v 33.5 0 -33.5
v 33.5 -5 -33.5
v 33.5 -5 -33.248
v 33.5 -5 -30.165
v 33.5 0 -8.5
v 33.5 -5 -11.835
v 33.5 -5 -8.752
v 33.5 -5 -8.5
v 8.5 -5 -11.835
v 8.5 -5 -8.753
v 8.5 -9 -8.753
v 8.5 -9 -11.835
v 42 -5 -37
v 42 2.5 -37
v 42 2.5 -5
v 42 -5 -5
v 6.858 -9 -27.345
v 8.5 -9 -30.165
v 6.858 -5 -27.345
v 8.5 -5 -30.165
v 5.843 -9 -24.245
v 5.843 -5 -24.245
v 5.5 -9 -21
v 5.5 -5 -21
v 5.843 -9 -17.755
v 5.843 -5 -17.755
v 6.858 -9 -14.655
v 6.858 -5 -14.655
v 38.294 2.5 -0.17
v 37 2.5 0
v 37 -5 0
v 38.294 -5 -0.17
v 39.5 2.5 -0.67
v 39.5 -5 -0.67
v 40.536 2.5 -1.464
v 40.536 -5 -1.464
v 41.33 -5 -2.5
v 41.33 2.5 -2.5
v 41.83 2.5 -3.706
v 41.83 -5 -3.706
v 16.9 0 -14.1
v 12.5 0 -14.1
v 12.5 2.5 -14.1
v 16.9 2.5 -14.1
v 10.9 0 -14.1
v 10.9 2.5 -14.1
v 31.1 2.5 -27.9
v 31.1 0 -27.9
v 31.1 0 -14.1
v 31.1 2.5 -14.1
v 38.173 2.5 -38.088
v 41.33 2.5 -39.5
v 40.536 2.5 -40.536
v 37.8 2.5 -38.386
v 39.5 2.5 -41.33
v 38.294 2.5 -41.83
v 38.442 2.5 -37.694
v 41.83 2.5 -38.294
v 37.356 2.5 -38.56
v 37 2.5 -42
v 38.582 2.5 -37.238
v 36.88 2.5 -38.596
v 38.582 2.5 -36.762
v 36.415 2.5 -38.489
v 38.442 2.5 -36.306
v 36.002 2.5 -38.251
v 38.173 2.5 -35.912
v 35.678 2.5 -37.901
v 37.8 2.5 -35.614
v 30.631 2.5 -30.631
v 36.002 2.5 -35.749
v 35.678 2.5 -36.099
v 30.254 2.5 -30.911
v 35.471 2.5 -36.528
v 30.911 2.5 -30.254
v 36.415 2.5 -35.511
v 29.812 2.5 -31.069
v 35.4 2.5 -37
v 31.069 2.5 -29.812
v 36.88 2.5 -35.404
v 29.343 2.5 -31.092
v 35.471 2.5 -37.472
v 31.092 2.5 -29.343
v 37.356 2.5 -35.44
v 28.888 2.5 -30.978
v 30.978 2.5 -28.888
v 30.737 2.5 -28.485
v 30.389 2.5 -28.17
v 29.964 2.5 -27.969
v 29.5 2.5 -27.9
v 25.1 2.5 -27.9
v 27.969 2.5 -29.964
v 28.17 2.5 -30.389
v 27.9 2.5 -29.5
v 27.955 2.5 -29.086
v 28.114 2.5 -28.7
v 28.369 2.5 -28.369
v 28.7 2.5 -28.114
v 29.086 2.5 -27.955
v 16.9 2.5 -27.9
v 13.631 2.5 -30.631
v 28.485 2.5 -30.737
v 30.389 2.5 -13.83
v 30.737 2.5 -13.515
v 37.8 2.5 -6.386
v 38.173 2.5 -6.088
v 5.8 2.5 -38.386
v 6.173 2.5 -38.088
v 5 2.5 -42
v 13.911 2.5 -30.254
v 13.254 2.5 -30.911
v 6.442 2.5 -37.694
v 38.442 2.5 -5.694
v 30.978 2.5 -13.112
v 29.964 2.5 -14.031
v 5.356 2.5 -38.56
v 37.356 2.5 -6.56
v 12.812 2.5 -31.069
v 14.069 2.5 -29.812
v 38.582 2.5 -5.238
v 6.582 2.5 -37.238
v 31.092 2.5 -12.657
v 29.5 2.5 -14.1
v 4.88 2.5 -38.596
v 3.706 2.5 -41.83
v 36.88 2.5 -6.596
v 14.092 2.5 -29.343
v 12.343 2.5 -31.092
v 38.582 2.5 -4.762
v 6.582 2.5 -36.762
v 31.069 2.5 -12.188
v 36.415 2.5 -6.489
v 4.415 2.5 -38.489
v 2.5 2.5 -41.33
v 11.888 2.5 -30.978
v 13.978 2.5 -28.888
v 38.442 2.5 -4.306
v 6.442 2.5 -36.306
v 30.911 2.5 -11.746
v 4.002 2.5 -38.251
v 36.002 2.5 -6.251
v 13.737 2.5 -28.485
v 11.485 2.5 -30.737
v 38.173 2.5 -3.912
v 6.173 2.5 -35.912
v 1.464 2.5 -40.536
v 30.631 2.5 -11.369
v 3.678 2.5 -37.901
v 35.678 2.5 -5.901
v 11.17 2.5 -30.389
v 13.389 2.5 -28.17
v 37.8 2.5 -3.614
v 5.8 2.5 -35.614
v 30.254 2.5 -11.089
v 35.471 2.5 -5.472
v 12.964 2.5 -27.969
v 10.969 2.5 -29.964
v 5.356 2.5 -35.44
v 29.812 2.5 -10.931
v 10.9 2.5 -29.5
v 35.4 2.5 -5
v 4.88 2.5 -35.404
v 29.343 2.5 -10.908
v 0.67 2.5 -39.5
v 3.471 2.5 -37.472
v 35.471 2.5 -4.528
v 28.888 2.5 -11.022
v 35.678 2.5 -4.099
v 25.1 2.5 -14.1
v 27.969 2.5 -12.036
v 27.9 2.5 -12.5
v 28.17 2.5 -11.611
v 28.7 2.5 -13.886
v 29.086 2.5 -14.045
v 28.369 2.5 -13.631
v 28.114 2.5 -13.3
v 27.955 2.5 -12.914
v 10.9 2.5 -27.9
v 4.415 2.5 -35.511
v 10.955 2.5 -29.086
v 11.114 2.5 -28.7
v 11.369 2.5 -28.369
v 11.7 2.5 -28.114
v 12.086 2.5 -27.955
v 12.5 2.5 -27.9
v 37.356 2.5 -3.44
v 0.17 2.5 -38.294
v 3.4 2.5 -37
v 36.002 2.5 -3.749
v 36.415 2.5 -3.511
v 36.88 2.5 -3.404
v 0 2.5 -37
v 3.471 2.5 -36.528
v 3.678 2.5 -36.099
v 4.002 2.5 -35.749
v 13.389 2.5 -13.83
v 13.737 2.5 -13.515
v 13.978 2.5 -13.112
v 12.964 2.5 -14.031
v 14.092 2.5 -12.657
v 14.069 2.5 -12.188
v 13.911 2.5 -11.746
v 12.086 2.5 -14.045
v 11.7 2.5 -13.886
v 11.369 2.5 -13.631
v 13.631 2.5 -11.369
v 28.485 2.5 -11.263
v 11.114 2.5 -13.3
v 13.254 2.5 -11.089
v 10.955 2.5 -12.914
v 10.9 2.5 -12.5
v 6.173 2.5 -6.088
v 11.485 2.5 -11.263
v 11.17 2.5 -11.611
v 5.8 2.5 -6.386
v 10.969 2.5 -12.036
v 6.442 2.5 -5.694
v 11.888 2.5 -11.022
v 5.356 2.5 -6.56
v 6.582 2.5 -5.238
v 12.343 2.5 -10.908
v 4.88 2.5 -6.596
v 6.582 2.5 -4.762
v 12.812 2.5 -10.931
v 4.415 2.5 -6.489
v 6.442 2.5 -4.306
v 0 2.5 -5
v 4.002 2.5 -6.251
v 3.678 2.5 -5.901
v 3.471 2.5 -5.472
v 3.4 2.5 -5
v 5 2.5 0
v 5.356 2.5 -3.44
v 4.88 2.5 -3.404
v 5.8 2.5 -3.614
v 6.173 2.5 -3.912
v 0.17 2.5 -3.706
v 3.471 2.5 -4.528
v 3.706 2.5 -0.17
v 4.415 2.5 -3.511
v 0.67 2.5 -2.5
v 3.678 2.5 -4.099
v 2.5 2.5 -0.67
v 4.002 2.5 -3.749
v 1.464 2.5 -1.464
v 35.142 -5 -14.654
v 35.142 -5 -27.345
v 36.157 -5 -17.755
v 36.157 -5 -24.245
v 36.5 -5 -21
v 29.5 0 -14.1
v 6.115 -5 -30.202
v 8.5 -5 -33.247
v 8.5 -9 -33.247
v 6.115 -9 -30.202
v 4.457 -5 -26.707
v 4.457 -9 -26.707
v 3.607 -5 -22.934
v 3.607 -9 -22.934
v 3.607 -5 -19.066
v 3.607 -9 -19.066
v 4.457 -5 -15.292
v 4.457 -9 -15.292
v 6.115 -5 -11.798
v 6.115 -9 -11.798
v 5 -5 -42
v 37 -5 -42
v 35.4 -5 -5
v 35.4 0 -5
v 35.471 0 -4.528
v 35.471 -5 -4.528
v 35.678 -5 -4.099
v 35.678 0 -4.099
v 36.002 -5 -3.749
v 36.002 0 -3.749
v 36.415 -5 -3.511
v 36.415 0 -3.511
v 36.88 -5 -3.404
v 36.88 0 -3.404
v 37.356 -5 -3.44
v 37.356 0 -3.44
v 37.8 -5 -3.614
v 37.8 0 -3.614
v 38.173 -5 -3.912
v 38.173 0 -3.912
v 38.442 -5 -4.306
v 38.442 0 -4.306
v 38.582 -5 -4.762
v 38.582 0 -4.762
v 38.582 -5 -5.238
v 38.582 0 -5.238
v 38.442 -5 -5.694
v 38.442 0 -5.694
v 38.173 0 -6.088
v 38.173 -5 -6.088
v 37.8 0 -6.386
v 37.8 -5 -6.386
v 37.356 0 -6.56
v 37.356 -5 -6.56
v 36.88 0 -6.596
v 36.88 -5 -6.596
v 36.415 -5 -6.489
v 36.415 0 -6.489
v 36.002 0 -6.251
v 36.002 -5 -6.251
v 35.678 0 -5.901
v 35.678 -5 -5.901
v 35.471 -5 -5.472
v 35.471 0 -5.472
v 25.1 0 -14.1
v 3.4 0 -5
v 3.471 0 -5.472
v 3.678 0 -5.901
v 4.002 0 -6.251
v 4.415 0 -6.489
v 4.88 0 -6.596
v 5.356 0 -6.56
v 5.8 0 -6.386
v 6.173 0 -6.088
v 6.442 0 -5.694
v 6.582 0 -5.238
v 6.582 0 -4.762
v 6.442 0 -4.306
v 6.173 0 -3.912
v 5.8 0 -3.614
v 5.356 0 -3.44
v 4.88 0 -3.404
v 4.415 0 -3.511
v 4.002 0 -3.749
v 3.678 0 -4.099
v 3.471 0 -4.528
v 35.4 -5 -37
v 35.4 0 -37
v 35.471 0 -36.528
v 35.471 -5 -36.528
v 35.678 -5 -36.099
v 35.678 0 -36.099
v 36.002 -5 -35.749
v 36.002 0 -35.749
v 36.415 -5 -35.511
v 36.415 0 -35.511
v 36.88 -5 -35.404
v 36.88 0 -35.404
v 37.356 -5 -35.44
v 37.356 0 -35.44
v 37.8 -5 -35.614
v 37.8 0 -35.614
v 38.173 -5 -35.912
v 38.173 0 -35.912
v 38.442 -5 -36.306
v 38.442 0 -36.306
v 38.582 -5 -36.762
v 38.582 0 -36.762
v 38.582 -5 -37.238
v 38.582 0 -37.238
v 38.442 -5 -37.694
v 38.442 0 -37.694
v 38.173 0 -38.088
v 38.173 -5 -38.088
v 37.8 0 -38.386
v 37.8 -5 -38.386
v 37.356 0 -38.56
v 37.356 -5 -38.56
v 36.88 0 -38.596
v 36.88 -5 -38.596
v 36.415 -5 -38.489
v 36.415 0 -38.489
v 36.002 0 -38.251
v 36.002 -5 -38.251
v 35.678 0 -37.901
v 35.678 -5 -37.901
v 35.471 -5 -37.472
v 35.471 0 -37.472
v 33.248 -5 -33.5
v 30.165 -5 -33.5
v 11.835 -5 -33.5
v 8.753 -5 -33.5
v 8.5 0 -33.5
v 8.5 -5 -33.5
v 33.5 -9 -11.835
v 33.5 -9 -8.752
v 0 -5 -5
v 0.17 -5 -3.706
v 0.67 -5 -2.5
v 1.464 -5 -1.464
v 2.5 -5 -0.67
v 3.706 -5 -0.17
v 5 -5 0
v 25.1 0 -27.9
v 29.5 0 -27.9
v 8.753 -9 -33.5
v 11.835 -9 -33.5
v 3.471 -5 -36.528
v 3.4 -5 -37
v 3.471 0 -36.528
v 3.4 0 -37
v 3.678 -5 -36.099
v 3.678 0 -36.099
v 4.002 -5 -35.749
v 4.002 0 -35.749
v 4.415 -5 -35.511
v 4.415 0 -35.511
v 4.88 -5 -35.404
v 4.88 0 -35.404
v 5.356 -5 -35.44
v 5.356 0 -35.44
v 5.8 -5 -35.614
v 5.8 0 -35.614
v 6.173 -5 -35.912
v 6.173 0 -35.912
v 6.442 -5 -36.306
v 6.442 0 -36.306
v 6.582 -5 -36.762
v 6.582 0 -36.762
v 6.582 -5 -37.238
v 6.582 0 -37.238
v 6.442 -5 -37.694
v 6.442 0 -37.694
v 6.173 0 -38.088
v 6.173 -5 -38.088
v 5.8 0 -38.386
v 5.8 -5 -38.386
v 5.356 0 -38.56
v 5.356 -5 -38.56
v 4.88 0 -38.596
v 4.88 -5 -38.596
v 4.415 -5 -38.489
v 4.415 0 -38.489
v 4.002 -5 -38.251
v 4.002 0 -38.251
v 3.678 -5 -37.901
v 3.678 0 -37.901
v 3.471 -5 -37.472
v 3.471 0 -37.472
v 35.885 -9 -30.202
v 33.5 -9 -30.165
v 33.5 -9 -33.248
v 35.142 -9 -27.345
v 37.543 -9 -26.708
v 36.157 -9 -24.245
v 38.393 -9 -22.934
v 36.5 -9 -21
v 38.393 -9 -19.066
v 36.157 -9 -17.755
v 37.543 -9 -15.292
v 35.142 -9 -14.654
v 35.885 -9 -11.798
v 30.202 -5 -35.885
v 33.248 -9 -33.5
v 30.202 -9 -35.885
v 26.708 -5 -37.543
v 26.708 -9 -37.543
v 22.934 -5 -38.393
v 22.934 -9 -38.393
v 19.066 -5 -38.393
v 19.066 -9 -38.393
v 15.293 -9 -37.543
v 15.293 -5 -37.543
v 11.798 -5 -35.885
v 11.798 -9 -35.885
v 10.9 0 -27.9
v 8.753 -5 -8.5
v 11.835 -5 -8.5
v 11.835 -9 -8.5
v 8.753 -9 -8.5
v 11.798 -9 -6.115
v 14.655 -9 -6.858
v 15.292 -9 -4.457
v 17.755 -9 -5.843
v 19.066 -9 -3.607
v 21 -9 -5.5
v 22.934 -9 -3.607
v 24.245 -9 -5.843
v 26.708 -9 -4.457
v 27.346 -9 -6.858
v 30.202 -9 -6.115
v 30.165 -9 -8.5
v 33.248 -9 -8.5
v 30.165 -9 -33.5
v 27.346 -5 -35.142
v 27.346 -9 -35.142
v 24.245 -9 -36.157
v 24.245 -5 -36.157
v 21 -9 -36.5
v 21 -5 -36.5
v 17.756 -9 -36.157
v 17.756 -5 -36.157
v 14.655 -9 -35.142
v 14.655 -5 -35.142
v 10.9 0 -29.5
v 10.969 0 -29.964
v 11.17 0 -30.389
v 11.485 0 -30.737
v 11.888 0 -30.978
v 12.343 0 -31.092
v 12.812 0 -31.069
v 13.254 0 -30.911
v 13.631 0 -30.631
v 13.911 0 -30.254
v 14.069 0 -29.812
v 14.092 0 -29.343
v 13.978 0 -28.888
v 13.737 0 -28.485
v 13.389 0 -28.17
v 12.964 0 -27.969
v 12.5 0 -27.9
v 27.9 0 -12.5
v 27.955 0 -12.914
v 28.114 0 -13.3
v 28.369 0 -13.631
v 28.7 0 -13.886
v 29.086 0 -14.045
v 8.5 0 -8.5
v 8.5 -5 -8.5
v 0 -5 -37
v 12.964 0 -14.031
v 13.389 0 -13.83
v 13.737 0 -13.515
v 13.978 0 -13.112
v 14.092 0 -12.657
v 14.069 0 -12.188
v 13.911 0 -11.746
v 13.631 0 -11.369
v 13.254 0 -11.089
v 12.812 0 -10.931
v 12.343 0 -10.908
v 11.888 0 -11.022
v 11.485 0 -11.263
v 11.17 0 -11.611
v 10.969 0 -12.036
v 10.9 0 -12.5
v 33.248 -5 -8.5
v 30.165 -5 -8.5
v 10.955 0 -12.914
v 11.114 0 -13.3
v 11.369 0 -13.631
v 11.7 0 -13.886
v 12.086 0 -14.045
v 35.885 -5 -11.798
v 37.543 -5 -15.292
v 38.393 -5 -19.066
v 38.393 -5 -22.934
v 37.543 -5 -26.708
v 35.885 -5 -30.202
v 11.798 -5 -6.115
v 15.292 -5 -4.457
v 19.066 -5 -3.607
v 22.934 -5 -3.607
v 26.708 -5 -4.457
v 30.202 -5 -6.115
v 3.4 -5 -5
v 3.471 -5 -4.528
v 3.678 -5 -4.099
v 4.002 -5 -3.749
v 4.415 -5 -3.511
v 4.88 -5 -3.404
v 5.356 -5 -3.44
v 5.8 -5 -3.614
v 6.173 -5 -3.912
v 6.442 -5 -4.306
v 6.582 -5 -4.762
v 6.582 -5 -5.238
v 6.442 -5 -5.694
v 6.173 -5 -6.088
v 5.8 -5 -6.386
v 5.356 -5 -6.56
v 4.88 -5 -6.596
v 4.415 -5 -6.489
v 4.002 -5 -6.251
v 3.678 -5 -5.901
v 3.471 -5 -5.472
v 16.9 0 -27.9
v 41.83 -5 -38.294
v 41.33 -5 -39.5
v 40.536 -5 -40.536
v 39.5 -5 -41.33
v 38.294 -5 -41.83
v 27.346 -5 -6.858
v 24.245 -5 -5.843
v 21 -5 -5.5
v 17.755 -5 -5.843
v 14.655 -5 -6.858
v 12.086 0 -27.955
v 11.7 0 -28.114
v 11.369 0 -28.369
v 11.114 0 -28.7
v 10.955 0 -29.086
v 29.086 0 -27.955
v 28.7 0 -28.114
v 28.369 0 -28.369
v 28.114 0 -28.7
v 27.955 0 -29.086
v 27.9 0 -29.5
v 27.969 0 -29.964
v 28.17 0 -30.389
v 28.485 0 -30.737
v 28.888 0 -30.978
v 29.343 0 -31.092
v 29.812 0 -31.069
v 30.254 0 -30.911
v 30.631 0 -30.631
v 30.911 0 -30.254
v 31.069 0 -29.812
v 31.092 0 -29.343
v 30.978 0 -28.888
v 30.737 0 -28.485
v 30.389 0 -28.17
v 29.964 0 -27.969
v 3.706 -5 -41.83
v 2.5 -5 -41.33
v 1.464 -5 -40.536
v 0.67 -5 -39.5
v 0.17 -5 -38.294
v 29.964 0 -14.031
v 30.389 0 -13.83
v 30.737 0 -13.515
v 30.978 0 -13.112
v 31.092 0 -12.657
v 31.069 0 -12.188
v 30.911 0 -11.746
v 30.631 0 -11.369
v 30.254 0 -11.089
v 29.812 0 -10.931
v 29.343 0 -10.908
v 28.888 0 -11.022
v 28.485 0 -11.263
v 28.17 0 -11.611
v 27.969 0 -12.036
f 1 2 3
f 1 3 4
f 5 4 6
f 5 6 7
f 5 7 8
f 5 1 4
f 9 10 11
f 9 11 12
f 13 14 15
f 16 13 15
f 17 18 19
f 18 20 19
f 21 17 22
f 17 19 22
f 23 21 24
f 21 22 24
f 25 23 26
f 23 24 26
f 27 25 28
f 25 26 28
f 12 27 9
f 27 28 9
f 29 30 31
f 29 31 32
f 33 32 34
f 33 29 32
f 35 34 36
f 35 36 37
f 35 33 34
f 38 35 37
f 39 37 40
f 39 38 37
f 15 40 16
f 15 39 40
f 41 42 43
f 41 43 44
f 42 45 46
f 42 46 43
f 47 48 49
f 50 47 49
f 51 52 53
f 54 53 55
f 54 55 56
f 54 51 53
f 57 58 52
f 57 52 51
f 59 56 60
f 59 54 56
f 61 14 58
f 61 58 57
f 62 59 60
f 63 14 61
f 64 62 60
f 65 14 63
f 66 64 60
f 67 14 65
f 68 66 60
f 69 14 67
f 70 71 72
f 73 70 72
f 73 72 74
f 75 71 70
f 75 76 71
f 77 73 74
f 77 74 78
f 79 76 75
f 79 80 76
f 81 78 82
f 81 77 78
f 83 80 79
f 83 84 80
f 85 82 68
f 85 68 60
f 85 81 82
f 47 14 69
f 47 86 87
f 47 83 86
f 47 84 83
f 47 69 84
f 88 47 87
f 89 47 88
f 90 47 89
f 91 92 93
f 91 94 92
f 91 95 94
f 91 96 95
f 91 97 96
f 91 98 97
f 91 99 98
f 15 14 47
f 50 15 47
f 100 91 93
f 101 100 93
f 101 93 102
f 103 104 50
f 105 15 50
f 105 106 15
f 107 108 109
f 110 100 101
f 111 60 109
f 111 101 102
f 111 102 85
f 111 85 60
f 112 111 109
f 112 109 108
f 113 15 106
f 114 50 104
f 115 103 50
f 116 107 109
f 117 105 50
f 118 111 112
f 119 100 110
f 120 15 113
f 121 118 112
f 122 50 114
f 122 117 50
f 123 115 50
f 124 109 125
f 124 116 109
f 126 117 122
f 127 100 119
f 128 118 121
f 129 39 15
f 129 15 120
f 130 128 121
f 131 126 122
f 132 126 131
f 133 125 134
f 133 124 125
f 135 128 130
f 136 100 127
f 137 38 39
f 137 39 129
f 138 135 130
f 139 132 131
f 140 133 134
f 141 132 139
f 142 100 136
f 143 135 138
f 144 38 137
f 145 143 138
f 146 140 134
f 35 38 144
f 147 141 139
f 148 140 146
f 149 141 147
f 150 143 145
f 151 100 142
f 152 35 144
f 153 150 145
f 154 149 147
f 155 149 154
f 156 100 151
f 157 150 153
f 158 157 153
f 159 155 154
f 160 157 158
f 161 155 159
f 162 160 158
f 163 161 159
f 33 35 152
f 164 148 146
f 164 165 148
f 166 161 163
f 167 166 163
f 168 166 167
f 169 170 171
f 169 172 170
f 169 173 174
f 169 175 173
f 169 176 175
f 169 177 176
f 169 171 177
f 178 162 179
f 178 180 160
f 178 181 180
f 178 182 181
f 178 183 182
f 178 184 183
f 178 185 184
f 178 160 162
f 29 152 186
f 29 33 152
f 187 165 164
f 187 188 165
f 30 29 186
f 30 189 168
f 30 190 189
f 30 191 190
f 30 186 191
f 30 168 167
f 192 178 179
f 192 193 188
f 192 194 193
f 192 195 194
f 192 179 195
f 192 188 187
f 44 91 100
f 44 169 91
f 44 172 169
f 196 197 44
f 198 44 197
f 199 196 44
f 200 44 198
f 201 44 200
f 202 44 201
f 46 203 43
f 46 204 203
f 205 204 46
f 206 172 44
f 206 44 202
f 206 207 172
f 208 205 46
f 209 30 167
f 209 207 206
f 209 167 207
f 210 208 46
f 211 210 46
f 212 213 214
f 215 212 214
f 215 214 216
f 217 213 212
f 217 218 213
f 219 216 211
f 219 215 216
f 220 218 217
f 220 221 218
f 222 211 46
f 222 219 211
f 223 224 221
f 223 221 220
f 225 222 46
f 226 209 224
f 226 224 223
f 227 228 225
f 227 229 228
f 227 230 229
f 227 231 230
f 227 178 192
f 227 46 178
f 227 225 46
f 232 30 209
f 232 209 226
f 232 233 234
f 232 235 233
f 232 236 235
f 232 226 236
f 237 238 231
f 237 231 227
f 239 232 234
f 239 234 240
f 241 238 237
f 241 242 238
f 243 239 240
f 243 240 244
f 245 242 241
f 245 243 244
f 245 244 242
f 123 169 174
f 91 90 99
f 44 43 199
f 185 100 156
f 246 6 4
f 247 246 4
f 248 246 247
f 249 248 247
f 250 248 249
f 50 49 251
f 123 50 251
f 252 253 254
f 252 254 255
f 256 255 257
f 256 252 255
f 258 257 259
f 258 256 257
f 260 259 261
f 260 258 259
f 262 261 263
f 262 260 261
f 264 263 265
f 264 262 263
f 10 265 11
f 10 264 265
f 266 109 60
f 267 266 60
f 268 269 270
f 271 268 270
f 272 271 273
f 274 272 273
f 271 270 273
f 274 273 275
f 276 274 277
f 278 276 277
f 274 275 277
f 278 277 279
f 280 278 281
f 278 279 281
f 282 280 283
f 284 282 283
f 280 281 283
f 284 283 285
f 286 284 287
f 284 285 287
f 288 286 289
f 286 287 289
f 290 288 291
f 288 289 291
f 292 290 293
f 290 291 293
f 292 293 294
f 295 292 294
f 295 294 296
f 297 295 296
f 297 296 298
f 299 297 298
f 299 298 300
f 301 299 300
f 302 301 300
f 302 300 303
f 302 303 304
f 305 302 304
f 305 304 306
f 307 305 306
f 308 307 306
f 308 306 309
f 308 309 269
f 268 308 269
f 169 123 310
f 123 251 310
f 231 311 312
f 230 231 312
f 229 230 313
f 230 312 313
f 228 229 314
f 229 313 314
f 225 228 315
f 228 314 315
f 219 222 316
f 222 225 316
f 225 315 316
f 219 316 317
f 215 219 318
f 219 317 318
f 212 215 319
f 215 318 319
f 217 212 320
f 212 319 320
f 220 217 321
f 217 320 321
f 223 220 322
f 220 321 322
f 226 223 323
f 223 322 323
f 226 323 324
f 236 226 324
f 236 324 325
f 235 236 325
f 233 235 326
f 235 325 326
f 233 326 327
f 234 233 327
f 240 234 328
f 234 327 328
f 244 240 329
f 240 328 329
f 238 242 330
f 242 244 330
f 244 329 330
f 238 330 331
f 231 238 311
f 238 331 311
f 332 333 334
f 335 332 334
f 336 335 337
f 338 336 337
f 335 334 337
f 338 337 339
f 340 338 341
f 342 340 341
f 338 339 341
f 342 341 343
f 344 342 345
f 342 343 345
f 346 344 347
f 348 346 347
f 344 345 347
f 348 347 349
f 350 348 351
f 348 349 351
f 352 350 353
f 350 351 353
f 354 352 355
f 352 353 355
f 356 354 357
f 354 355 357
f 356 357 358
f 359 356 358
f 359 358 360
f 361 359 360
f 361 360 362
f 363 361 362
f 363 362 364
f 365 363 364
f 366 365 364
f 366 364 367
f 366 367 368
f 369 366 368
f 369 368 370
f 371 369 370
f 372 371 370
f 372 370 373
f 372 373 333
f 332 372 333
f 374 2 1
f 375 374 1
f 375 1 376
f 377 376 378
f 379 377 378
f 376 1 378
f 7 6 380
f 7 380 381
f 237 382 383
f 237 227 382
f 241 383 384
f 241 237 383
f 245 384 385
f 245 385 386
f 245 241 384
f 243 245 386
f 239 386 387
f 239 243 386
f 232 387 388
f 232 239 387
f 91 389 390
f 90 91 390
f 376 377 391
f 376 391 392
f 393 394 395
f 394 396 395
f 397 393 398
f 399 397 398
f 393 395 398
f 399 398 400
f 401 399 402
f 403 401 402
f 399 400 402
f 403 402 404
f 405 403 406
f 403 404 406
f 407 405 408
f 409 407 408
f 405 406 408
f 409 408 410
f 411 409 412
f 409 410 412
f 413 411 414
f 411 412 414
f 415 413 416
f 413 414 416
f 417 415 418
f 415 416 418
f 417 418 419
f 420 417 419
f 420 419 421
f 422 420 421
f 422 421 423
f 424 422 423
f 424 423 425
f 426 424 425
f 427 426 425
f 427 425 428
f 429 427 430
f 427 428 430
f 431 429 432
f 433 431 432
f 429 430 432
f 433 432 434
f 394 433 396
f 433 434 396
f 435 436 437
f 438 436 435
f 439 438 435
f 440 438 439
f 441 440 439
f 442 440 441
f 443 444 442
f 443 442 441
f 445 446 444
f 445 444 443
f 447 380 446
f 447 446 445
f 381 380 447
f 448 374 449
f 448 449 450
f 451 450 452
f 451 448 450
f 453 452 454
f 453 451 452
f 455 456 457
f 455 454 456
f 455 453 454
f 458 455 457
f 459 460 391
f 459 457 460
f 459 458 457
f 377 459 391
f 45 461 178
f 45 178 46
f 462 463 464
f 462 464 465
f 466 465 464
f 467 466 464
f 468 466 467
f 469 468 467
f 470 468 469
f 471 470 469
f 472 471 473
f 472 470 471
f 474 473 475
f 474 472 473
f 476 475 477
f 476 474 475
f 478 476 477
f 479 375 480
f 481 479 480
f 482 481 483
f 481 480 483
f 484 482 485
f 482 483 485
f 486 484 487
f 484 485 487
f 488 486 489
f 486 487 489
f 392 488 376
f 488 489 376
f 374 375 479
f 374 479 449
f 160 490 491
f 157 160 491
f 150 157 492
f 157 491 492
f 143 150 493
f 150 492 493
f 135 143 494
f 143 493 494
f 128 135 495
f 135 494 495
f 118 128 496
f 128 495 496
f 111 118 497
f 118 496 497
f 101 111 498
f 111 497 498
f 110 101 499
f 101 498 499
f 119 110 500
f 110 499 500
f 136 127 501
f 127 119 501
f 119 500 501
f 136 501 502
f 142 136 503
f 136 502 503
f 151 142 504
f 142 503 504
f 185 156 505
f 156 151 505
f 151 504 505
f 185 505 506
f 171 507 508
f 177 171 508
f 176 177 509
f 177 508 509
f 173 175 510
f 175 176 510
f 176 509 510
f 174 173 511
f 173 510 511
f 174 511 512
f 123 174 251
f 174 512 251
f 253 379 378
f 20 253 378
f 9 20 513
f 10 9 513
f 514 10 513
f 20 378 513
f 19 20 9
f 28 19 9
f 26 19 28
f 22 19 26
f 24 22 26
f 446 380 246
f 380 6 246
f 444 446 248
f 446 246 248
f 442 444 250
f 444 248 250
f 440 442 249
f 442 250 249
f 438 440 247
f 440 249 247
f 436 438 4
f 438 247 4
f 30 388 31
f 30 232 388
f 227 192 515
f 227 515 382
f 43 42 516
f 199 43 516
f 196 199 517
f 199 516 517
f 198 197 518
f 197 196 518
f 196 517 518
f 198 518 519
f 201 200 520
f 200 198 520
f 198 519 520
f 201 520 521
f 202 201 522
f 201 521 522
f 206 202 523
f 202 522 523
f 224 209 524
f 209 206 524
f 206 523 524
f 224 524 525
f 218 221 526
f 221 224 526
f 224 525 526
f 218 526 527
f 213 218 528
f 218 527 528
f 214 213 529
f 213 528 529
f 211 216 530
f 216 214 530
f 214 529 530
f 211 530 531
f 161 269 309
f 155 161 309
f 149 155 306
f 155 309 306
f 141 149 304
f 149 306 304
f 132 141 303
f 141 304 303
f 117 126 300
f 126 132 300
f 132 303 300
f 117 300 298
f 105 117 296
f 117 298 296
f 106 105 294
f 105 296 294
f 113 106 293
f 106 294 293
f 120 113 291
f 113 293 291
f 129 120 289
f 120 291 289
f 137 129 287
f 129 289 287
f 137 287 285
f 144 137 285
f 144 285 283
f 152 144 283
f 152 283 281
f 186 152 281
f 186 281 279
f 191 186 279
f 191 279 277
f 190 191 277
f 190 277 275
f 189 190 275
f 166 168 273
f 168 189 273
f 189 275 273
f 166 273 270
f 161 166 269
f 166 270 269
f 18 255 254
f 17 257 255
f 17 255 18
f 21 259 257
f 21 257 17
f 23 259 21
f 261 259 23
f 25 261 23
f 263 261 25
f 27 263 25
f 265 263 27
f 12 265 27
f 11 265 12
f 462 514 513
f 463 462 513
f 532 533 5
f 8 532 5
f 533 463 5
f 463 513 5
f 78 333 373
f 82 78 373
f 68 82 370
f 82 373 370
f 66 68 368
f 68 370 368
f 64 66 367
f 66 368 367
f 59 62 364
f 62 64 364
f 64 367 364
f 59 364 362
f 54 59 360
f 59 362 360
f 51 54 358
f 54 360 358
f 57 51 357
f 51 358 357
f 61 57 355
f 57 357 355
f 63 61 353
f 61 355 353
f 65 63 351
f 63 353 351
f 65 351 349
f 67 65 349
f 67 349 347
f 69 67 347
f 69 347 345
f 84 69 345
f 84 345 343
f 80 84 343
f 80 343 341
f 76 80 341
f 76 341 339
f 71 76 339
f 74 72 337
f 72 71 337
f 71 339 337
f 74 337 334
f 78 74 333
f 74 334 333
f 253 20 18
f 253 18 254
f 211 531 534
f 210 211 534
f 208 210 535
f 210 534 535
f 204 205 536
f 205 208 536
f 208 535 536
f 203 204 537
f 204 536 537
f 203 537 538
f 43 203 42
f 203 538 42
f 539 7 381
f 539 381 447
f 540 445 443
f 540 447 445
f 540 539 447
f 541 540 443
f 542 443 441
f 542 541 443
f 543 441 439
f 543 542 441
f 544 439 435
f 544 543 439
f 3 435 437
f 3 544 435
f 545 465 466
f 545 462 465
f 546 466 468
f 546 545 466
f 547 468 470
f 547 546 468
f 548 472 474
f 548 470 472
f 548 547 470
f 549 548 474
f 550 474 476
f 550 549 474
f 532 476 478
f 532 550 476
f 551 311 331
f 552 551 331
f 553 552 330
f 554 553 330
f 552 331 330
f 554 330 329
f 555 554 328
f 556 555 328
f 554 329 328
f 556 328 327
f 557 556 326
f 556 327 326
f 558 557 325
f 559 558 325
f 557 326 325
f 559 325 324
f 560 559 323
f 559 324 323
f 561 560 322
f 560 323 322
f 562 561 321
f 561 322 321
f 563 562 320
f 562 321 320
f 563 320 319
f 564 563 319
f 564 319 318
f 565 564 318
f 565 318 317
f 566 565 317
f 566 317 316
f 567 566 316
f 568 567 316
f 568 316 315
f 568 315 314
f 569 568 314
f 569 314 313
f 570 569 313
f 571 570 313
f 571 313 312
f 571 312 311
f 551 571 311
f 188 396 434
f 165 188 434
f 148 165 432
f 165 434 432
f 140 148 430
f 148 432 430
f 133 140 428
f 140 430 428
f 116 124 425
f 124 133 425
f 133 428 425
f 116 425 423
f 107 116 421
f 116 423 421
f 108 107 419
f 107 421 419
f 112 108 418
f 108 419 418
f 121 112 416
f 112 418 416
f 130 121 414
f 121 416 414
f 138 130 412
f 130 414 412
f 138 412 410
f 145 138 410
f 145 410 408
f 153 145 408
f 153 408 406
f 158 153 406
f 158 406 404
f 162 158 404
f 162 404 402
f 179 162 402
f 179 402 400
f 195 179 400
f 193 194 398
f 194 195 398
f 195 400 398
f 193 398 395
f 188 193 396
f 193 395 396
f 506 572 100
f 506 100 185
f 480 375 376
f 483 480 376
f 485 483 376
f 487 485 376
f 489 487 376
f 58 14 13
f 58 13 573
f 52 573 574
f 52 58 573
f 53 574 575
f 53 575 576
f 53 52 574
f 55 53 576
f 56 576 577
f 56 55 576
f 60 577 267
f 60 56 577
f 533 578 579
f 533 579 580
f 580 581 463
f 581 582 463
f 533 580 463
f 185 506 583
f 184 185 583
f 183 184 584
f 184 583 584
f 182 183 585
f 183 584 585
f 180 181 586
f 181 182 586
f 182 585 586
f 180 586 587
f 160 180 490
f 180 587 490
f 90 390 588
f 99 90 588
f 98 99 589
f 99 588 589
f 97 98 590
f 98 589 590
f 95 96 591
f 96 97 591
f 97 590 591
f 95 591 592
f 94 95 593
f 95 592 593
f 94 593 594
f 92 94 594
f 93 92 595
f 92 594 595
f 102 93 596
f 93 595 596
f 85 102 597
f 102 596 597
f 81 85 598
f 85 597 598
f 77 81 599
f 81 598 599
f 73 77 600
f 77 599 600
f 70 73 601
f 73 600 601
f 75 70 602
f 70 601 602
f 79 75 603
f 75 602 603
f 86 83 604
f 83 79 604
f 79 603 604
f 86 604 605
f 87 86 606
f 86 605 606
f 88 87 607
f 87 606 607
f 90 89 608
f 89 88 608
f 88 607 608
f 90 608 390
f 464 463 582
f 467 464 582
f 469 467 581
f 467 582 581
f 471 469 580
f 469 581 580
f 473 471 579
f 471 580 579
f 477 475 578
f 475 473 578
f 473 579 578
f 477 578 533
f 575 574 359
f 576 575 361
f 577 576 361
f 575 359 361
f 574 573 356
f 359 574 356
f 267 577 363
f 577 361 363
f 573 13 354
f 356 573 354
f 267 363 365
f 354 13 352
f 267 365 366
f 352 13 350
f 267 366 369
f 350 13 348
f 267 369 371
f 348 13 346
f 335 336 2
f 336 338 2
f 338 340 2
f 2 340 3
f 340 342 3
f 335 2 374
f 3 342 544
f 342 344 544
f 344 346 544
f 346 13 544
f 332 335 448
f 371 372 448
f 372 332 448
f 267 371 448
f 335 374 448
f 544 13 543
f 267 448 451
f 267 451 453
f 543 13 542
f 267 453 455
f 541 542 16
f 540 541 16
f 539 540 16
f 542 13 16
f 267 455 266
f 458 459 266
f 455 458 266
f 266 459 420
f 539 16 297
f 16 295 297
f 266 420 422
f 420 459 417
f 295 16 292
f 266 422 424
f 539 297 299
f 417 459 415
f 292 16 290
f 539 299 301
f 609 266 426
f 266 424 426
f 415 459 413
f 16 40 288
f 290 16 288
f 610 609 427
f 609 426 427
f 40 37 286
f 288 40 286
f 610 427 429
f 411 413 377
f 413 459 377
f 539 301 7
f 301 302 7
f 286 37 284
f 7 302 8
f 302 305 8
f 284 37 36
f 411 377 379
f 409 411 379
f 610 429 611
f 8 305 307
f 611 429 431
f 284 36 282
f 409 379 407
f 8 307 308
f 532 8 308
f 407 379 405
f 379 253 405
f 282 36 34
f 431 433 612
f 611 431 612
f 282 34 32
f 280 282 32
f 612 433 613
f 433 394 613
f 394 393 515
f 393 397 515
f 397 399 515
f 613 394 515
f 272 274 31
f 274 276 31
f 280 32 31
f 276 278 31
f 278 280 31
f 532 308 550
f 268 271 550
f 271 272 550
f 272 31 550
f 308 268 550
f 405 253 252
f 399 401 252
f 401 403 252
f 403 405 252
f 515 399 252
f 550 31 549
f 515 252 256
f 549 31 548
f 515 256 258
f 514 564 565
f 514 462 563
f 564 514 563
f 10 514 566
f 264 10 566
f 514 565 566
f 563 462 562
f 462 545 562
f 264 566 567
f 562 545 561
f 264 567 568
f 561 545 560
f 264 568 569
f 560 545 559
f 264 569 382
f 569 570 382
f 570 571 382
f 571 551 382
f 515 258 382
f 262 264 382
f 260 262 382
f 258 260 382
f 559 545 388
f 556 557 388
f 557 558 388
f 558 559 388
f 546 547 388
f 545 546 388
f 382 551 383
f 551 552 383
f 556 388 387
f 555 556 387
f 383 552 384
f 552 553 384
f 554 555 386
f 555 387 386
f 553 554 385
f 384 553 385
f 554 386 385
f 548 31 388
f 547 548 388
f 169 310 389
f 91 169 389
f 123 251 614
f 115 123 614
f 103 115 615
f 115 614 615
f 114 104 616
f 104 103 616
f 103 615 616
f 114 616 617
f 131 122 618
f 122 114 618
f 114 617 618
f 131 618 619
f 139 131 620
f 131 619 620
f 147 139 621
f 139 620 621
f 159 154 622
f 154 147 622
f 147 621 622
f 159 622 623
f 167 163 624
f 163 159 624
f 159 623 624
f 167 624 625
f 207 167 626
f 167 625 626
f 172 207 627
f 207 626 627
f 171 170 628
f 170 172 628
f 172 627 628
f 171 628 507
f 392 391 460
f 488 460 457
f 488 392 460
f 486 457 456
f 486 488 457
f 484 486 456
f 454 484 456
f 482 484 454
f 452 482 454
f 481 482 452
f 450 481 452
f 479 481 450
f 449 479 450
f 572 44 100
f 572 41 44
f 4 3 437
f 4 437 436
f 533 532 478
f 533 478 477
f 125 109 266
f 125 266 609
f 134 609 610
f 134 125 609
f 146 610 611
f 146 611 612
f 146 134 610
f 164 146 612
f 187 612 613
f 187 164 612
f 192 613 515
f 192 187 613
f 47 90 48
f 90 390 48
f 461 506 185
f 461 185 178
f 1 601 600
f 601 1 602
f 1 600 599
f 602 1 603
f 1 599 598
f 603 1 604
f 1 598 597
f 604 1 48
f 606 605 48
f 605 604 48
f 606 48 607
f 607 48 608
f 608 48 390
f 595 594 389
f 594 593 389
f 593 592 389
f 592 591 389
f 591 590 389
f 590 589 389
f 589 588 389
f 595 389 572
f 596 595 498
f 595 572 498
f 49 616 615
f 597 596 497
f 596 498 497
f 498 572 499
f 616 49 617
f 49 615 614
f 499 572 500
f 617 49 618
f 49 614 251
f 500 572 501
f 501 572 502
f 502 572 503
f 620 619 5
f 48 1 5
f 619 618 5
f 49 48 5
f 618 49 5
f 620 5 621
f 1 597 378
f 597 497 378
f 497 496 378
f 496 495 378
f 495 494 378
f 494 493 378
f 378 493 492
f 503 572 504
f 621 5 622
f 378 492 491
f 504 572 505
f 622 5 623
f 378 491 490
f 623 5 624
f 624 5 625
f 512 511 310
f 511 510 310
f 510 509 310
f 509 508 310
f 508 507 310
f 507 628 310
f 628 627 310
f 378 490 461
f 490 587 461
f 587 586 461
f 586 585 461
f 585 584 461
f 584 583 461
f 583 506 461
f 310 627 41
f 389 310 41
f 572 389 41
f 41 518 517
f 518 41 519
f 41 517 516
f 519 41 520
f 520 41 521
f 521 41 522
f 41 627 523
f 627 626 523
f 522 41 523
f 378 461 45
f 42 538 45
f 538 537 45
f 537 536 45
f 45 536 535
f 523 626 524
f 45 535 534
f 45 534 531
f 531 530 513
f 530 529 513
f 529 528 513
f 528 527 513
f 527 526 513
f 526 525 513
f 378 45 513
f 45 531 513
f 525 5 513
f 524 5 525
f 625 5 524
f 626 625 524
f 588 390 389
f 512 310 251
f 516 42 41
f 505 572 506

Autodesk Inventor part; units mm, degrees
ref_plane "YZ Plane" through (0, 0, 0) normal (1, 0, 0) x (0, 1, 0)
ref_plane "XZ Plane" through (0, 0, 0) normal (0, 1, 0) x (-1, 0, 0)
ref_plane "XY Plane" through (0, 0, 0) normal (0, 0, 1) x (1, 0, 0)
sketch "スケッチ1" plane through (0, 0, 0) normal (0, 1, 0) x (-1, 0, 0)
  line L0 (-5, 0) -> (-21, 0)
  line L1 (-21, -21) -> (0, -21)
  line L2 (0, -21) -> (0, -5)
  arc A0 (0, -5) -> (-5, 0) centre (-5, -5) ccw
  line L3 (0, -5) -> (0, -8)
  circle A1 centre (-5, -5) radius 1.6
  line L4 (-21, -21) -> (-8.5, -21)
  line L5 (-8.5, -21) -> (-8.5, -8.5)
  line L6 (-8.5, -8.5) -> (-21, -8.5)
  line L7 (-8.5, -8.5) -> (-8.5, -11.5)
  circle A2 centre (-12.5, -12.5) radius 1.6
  line L8 (-5, -42) -> (-21, -42)
  line L9 (0, -21) -> (0, -37)
  arc A3 (-5, -42) -> (0, -37) centre (-5, -37) ccw
  line L10 (0, -37) -> (0, -34)
  circle A4 centre (-5, -37) radius 1.6
  line L11 (-8.5, -21) -> (-8.5, -33.5)
  line L12 (-8.5, -33.5) -> (-21, -33.5)
  line L13 (-8.5, -33.5) -> (-8.5, -30.5)
  circle A5 centre (-12.5, -29.5) radius 1.6
  line L14 (-37, 0) -> (-21, 0)
  line L15 (-21, -21) -> (-42, -21)
  line L16 (-42, -21) -> (-42, -5)
  arc A6 (-37, 0) -> (-42, -5) centre (-37, -5) ccw
  line L17 (-42, -5) -> (-42, -8)
  circle A7 centre (-37, -5) radius 1.6
  line L18 (-21, -21) -> (-33.5, -21)
  line L19 (-33.5, -21) -> (-33.5, -8.5)
  line L20 (-33.5, -8.5) -> (-21, -8.5)
  line L21 (-33.5, -8.5) -> (-33.5, -11.5)
  circle A8 centre (-29.5, -12.5) radius 1.6
  circle A9 centre (-37, -37) radius 1.6
  line L22 (-42, -37) -> (-42, -34)
  line L23 (-33.5, -33.5) -> (-33.5, -30.5)
  circle A10 centre (-29.5, -29.5) radius 1.6
  line L24 (-37, -42) -> (-21, -42)
  line L25 (-42, -21) -> (-42, -37)
  line L26 (-33.5, -33.5) -> (-21, -33.5)
  line L27 (-33.5, -21) -> (-33.5, -33.5)
  arc A11 (-42, -37) -> (-37, -42) centre (-37, -37) ccw
  line L28 (-10.9, -14.1) -> (-16.9, -14.1)
  line L29 (-16.9, -14.1) -> (-16.9, -27.9)
  line L30 (-16.9, -27.9) -> (-10.9, -27.9)
  line L31 (-10.9, -27.9) -> (-10.9, -14.1)
  line L32 (-31.1, -14.1) -> (-25.1, -14.1)
  line L33 (-25.1, -14.1) -> (-25.1, -27.9)
  line L34 (-25.1, -27.9) -> (-31.1, -27.9)
  line L35 (-31.1, -27.9) -> (-31.1, -14.1)
  point P0 (0, 0)
  point P1 (0, -42)
  point P2 (-42, 0)
  point P3 (-42, -42)
  point P4 (-12.5, -14.1)
  point P5 (-12.5, -27.9)
  point P6 (-29.5, -14.1)
  point P7 (-29.5, -27.9)
  dimension "d0" = 21
  dimension "d1" = 21
  dimension "d6" = 3.2
  dimension "d7" = 12.5
  dimension "d8" = 12.5
  dimension "d9" = 3
  dimension "d11" = 3.2
  dimension "d21" = 17
  dimension "d22" = 17
  dimension "d23" = 17
  dimension "d24" = 17
  dimension "d25" = 4
  dimension "d26" = 4
  dimension "d27" = 4
  dimension "d28" = 4
  dimension "d29" = 3.2
  dimension "d30" = 3.2
  dimension "d31" = 3.2
  dimension "d32" = 2.4
  dimension "d33" = 2.4
  dimension "d34" = 6
  dimension "d35" = 6
extrude "押し出し2" add sketch "スケッチ1" against normal blind 5 contours A0 L2 L1 L5 L6 L20 L19 L15 L16 A6 L14 L0 | L9 A3 L8 L24 A11 L22 L25 L15 L27 L23 L26 L12 L11 L1
sketch "スケッチ2" plane through (0, -5, 0) normal (0, -1, 0) x (1, 0, 0)
  line L0 (33.5, -8.5) -> (8.5, -8.5) projected
  line L1 (8.5, -33.5) -> (33.5, -33.5) projected
  line L2 (33.5, -8.5) -> (8.5, -8.5)
  line L3 (8.5, -8.5) -> (8.5, -33.5)
  line L4 (8.5, -33.5) -> (33.5, -33.5)
  line L5 (33.5, -33.5) -> (33.5, -8.5)
  arc A0 (8.5, -8.7526) -> (8.5, -33.2473) centre (21.0001, -21) ccw
  arc A1 (8.5, -11.8349) -> (8.5, -30.165) centre (21.0001, -21) ccw
  arc A2 (30.1653, -8.5) -> (11.8349, -8.5) centre (21.0001, -21) ccw
  arc A3 (33.2476, -8.5) -> (8.7526, -8.5) centre (21.0001, -21) ccw
  arc A4 (11.835, -33.5) -> (30.1652, -33.5) centre (21.0001, -21) ccw
  arc A5 (33.5, -30.1652) -> (33.5, -11.8347) centre (21.0001, -21) ccw
  arc A6 (8.7527, -33.5) -> (33.2475, -33.5) centre (21.0001, -21) ccw
  arc A7 (33.5, -33.2475) -> (33.5, -8.7524) centre (21.0001, -21) ccw
  point P0 (0, 0)
  point P1 (30.1652, -33.5)
  point P2 (33.2476, -8.5)
  point P3 (8.7526, -8.5)
  point P4 (11.8349, -8.5)
extrude "押し出し4" add sketch "スケッチ1" along normal blind 2.5 contours A0 L2 L1 L5 L6 L20 L19 L15 L16 A6 L14 L0 | L9 A3 L8 L24 A11 L22 L25 L15 L27 L23 L26 L12 L11 L1 | L11 L12 L26 L23 L27 L15 L35 L34 L33 L1 L29 L30 L31 | L1 L31 L28 L29 L15 L33 L32 L35 L19 L20 L6 L5
extrude "押し出し5" add sketch "スケッチ2" along normal blind 4 contours L0 A2 A3 | A7 L5 A5 | L3 A1 A0 | A6 L1 A4
properties part number "mounter"
